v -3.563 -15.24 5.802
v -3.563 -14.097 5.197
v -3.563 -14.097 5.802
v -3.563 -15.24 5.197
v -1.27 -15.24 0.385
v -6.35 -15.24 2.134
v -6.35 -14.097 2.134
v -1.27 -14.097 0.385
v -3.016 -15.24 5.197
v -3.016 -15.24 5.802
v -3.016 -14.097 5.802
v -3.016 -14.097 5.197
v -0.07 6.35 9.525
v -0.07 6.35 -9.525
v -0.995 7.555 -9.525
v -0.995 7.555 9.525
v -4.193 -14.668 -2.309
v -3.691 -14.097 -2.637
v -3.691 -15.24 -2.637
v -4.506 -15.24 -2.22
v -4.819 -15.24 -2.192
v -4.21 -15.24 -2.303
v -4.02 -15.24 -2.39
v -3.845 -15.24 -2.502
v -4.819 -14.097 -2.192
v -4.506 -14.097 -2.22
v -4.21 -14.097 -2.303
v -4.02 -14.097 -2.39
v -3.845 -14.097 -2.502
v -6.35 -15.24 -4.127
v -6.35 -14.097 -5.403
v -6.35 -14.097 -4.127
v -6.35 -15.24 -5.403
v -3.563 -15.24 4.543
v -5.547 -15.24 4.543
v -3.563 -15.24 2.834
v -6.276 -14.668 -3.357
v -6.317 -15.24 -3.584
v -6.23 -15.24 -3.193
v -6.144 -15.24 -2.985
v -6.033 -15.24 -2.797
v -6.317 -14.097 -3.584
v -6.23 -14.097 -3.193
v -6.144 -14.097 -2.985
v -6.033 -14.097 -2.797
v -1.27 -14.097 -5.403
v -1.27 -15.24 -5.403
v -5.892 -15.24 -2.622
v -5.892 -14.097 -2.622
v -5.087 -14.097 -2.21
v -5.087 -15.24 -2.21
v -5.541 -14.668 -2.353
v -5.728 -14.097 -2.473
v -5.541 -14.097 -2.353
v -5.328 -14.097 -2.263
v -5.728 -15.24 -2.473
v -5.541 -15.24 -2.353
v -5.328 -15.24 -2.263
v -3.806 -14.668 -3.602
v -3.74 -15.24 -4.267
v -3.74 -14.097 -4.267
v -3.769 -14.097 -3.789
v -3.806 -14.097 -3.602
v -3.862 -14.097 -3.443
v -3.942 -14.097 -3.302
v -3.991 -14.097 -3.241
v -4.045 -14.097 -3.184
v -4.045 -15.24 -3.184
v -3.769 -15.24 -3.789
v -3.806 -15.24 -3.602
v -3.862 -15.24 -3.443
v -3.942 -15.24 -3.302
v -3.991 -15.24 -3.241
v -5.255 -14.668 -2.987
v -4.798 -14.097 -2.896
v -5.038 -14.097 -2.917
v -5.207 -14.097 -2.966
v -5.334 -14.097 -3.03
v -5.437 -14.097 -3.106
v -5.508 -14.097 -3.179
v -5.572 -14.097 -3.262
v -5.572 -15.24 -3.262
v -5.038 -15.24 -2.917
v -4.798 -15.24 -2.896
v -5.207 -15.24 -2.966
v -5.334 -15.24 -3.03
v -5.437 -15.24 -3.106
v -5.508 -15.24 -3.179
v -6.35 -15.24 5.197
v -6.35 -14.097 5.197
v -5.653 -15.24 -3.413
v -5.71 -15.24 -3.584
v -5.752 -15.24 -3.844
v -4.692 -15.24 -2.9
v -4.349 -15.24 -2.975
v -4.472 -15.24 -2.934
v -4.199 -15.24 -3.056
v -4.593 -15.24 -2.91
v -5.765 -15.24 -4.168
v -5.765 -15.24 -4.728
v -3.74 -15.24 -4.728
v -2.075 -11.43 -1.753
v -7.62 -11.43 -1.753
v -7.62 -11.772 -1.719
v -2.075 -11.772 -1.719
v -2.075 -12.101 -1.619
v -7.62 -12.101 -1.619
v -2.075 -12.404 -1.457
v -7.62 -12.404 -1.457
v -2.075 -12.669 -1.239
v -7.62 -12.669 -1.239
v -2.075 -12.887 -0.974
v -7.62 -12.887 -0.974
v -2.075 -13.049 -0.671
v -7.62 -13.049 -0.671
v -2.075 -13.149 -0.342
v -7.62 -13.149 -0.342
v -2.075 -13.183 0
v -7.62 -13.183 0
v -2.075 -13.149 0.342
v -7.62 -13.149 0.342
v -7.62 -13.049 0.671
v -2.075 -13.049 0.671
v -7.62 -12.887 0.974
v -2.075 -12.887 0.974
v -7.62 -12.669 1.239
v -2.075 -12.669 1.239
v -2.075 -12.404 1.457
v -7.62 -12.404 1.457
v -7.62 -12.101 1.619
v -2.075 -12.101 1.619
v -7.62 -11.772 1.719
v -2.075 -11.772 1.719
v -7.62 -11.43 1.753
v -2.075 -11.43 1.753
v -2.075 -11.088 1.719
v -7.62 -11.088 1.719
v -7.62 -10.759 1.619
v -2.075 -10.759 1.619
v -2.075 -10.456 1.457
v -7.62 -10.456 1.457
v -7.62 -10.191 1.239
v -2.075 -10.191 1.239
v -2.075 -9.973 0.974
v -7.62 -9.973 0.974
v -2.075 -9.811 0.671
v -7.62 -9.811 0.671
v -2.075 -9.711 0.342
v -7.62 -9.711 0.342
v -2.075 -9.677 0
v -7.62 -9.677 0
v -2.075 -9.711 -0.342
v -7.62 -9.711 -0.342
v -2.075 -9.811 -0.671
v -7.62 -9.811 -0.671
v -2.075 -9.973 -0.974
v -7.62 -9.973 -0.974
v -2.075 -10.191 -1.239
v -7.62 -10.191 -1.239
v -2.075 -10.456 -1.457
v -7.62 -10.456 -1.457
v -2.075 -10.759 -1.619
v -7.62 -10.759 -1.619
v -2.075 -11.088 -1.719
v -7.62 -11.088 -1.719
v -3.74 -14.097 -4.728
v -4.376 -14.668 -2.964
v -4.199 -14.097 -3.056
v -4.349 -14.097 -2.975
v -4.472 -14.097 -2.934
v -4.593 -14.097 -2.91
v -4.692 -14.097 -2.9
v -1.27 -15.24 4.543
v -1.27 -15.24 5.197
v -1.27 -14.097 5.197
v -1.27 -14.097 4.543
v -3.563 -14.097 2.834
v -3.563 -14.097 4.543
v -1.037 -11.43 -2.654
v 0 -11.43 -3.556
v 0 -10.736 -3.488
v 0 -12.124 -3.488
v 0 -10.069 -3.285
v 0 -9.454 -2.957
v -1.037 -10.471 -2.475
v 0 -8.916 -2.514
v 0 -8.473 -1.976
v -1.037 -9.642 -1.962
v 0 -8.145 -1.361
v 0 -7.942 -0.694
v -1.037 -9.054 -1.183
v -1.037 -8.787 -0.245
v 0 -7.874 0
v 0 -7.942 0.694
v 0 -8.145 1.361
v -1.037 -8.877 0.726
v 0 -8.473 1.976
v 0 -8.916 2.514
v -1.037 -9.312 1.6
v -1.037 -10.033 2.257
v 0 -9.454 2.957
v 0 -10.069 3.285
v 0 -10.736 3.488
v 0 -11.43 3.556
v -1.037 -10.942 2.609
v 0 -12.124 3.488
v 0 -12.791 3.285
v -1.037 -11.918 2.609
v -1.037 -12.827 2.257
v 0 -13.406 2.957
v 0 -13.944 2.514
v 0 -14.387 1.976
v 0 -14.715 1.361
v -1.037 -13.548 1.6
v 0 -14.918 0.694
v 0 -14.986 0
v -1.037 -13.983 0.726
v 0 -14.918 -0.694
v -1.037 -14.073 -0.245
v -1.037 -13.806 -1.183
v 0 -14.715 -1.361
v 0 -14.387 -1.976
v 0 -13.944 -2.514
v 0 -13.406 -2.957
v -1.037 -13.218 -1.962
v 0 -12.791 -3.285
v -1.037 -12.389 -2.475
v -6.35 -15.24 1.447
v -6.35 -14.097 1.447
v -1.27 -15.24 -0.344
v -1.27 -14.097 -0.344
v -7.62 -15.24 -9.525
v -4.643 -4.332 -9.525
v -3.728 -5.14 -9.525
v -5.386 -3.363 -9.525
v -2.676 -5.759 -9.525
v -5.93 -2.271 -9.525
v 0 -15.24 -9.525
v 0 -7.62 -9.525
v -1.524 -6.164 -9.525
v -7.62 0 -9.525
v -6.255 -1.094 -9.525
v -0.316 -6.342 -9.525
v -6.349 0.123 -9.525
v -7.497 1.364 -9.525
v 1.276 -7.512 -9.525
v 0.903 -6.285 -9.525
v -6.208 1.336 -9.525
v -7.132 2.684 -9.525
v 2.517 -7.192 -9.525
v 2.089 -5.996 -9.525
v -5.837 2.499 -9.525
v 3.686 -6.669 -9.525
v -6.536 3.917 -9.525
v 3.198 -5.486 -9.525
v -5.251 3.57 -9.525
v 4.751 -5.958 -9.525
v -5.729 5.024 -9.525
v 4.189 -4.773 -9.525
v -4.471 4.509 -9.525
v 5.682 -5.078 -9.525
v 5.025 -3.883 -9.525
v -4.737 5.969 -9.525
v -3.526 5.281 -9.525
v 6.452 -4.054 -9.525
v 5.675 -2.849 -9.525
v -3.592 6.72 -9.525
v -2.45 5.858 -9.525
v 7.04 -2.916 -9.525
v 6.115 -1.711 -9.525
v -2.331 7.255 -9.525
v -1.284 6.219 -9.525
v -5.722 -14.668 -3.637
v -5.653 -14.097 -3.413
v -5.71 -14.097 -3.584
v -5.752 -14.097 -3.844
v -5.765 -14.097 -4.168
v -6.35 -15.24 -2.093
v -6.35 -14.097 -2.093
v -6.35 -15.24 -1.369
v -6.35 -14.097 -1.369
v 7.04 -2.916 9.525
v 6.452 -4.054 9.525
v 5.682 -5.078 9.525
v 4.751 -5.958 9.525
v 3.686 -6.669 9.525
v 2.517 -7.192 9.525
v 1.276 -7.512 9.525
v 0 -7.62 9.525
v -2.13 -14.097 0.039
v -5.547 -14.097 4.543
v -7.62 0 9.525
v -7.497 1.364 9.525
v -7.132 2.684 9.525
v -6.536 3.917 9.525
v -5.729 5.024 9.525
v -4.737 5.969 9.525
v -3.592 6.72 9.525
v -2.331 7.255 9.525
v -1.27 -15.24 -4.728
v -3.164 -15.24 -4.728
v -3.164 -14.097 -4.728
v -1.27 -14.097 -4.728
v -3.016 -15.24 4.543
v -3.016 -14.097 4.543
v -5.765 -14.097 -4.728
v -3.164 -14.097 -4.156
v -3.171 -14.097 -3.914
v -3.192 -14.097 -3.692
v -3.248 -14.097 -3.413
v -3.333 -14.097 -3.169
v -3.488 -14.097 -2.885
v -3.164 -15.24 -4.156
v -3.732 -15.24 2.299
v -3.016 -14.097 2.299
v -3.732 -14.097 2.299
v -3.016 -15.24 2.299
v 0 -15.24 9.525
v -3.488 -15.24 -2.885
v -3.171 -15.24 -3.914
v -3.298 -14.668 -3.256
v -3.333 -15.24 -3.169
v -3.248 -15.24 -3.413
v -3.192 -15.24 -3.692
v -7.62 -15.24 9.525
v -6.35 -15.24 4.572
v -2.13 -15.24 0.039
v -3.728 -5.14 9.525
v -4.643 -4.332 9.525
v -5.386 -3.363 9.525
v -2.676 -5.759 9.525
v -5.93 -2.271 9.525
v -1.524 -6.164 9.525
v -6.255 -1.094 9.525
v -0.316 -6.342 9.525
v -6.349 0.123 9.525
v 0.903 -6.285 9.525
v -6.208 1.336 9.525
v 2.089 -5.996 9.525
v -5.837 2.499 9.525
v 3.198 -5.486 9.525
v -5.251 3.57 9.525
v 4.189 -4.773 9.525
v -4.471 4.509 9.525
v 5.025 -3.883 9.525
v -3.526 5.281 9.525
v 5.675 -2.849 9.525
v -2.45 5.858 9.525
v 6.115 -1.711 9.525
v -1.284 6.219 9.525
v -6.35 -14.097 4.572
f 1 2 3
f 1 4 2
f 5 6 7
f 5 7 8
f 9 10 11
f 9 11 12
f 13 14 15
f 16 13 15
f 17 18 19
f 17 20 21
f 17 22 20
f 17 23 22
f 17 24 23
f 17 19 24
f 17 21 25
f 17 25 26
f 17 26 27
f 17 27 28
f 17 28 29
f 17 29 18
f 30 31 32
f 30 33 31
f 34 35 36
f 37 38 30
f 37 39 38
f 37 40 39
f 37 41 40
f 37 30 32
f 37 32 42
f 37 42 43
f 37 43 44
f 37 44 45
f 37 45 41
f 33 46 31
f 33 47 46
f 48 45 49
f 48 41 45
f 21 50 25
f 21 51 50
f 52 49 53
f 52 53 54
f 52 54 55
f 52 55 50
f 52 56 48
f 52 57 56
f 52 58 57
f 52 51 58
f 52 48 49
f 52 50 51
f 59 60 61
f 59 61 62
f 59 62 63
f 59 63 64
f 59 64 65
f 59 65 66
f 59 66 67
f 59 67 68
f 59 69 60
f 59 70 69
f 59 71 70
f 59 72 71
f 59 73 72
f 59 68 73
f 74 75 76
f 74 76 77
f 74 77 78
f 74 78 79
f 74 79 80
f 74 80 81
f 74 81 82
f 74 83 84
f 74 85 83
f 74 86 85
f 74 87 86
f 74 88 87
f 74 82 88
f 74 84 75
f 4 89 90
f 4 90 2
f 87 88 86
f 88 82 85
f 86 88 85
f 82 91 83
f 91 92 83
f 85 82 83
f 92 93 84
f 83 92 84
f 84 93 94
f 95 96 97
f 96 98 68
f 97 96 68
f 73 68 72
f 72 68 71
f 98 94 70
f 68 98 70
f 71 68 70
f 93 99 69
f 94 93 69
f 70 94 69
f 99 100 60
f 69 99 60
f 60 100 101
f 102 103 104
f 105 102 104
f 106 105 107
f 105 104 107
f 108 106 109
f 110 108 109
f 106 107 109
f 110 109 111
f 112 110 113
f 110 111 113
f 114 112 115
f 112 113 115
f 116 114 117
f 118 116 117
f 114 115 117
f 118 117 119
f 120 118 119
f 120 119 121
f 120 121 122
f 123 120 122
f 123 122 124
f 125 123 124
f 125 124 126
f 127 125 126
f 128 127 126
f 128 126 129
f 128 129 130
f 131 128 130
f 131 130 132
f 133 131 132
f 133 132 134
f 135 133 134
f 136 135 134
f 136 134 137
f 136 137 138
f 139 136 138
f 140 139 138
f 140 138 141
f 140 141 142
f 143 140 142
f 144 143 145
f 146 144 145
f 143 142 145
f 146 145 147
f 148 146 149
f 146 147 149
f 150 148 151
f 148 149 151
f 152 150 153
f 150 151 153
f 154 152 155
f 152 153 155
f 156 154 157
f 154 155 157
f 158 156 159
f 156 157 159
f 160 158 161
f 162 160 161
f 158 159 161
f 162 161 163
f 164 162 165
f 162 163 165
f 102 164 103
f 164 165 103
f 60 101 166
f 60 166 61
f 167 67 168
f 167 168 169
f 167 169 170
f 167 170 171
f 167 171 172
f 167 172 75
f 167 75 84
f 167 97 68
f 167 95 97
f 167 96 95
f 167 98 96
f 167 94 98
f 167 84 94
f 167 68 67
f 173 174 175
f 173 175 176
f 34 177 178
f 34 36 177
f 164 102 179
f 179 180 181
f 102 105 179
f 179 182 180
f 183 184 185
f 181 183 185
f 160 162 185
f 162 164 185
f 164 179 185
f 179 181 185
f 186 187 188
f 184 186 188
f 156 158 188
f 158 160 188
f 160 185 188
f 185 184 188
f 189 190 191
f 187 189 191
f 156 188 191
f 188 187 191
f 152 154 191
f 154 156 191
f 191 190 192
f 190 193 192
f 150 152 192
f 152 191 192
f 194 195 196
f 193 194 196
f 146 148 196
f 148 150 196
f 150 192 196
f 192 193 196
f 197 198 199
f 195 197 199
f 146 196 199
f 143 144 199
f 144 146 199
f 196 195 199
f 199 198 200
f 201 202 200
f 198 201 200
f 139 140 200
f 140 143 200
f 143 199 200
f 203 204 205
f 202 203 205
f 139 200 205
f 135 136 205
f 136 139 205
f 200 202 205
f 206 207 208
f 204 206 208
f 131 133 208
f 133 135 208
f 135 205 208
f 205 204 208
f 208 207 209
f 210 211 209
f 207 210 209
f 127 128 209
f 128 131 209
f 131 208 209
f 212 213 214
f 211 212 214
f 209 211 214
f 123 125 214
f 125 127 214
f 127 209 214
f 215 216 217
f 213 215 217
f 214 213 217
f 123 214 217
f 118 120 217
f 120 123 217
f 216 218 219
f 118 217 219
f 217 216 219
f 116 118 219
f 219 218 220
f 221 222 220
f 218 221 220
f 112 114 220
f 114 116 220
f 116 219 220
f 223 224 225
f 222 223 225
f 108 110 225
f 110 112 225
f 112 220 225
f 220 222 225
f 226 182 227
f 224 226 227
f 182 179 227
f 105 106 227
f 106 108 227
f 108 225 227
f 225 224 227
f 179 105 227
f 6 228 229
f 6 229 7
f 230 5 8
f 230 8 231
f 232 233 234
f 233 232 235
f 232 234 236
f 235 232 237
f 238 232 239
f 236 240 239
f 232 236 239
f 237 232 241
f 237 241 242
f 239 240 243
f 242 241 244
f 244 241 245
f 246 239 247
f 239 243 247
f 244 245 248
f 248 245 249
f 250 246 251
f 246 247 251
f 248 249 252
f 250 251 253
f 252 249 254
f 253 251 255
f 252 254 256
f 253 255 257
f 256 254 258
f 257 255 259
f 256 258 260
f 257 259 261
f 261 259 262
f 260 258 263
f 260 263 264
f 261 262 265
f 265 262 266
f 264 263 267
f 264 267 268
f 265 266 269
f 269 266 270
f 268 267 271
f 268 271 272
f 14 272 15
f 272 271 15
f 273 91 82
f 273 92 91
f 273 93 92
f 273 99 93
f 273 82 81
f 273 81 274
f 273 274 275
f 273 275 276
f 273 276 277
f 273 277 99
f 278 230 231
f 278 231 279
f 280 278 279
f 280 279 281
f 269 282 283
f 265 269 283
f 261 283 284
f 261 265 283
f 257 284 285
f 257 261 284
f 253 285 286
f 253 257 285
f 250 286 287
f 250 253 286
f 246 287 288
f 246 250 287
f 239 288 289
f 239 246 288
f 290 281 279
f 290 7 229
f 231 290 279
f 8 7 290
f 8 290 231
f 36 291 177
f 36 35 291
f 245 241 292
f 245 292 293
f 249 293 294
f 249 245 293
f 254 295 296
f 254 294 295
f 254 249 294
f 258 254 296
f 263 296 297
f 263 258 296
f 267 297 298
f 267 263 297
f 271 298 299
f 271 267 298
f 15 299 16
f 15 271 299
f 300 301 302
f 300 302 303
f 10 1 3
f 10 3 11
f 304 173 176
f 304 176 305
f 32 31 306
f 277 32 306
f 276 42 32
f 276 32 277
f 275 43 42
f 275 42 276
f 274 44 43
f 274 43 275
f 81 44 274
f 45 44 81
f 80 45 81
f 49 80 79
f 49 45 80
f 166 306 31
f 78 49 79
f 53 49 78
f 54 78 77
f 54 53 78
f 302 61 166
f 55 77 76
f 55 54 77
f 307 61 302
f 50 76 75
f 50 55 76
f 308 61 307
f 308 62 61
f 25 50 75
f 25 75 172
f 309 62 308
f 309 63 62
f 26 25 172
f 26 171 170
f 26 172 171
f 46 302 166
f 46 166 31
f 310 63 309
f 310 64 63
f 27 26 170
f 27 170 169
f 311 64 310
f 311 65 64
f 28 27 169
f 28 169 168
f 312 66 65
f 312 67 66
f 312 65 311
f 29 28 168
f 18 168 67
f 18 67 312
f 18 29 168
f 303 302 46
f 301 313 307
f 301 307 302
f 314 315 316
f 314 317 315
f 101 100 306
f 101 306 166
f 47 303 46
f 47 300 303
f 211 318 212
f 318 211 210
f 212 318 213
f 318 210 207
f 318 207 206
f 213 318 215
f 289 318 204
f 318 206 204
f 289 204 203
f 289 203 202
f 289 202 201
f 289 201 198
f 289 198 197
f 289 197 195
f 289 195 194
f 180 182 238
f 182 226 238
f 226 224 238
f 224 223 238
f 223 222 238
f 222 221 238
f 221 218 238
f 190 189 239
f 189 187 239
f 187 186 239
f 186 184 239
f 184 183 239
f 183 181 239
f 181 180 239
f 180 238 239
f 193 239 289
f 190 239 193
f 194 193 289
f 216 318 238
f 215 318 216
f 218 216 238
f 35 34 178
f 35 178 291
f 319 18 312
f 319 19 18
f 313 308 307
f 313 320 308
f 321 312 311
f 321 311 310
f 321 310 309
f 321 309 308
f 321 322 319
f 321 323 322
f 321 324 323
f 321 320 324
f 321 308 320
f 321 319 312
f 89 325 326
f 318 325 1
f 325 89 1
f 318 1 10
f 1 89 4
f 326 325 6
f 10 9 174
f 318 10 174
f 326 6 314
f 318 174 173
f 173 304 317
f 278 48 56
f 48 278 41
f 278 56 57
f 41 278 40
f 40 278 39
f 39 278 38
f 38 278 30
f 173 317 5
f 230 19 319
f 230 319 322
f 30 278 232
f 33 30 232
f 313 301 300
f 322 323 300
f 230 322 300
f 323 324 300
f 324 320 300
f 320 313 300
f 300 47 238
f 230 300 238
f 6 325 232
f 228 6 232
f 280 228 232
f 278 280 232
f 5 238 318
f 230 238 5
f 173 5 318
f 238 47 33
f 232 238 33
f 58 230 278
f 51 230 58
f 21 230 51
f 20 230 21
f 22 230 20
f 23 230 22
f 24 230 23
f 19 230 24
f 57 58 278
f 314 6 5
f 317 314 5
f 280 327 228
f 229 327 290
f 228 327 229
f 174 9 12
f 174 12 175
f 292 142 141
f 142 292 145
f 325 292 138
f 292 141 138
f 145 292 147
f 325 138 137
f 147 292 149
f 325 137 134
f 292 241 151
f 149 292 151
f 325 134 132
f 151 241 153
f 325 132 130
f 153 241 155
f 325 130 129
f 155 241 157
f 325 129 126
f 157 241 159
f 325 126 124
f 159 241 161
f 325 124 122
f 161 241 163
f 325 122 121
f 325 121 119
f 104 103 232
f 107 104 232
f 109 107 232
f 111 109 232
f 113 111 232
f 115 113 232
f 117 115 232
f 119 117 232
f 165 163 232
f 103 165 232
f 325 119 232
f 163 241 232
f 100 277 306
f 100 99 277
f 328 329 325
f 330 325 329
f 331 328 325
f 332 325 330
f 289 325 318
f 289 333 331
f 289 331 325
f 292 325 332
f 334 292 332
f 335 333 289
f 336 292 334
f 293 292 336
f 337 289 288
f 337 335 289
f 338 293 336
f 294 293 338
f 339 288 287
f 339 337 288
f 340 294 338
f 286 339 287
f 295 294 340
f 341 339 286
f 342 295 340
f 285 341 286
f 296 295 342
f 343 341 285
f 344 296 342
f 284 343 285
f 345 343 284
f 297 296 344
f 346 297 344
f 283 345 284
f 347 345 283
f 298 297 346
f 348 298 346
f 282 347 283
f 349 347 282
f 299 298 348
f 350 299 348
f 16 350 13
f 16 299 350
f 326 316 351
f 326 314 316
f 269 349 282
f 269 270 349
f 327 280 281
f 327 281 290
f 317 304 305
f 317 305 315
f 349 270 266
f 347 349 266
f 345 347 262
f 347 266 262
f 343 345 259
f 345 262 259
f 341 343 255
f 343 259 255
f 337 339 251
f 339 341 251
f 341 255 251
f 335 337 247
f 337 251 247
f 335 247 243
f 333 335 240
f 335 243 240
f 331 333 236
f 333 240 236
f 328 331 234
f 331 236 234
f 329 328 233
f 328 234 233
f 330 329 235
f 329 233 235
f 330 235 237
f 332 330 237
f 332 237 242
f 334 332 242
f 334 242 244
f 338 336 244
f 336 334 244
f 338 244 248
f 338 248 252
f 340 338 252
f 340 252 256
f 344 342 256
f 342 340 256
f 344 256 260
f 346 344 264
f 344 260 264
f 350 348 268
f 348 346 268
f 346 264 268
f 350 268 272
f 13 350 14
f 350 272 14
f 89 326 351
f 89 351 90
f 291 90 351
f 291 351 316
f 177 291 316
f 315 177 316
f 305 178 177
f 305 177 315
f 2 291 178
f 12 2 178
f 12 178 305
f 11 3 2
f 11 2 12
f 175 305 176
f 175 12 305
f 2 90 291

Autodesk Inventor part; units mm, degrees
ref_plane "YZ Plane" through (0, 0, 0) normal (1, 0, 0) x (0, 1, 0)
ref_plane "XZ Plane" through (0, 0, 0) normal (0, 1, 0) x (-1, 0, 0)
ref_plane "XY Plane" through (0, 0, 0) normal (0, 0, 1) x (1, 0, 0)
sketch "Sketch4" plane through (0, 0, 0) normal (0, 0, 1) x (1, 0, 0)
  arc A0 (-0.0698, 6.3496) -> (6.1152, -1.7109) centre (0, 0) ccw
  arc A1 (-0.9946, 7.5548) -> (7.04, -2.916) centre (0, 0) ccw
  line L0 (0, 0) -> (0, 7.9375) construction
  line L1 (-0.0698, 6.3496) -> (6.1152, -1.7109) construction
  line L2 (-0.0698, 6.3496) -> (-0.9946, 7.5548)
  line L3 (6.1152, -1.7109) -> (7.04, -2.916)
  circle A2 centre (0, 0) radius 6.35
  dimension "d10" = 12.7
  dimension "d11" = 1.27
  dimension "d12" = 37.5
  dimension "d13" = 10.16
extrude "Extrusion3" add sketch "Sketch4" along normal mid plane 19.05 contours A0 L3 A1 L2
sketch "Sketch5" plane through (0, 0, 0) normal (0, 0, 1) x (1, 0, 0)
  arc A0 (-0.9946, 7.5548) -> (7.04, -2.916) centre (0, 0) ccw projected
  line L0 (-7.62, 0) -> (-7.62, -15.24)
  line L1 (-7.62, -15.24) -> (0, -15.24)
  line L2 (0, -15.24) -> (0, -7.62)
  circle A1 centre (0, 0) radius 7.9375
  dimension "d16" = 7.62
extrude "Extrusion4" add sketch "Sketch5" along normal mid plane 19.05 contours A0 L2 A1 L0 | A1 L2 L1 L0 picked at (-7.3048, -2.4081)
sketch "Sketch6" plane through (0, -15.24, 9.525) normal (1, 0, 0) x (0, 0, -1)
  line L0 (0, 7.62) -> (19.05, 7.62) projected
  line L1 (19.05, 7.62) -> (19.05, 0) projected
  line L2 (0, 0) -> (19.05, 0) projected
  line L3 (0, 0) -> (0, 7.62) projected
  line L4 (0, 7.62) -> (19.05, 0) construction
  line L5 (19.05, 7.62) -> (0, 0) construction
  point P0 (9.525, 15.24)
  point P1 (9.525, 3.81)
hole "Hole1" at (0, -11.43, 0) direction (-1, 0, 0) diameter 3.5052 end through all countersink diameter 7.112 countersink angle 82
sketch "Sketch10" plane through (-7.62, -15.24, 9.525) normal (0, -1, 0) x (1, 0, 0)
  line L0 (0, -19.05) -> (0, 0) projected
  line L1 (7.62, -19.05) -> (0, -19.05) projected
  line L2 (7.62, 0) -> (7.62, -19.05) projected
  line L3 (0, 0) -> (7.62, 0) projected
  line L4 (3.81, -19.05) -> (3.81, 0) construction
  spline S0 degree 2 poles (2.8014, -11.7171) (3.1307, -11.7171) (3.7235, -11.9518) (3.9294, -12.1617) knots 0 0 0 1 2 2 2
  spline S1 degree 2 poles (3.9294, -12.1617) (4.1887, -12.4252) (4.4563, -13.1374) (4.4563, -13.6808) knots 0 0 0 1 2 2 2
  line L5 (4.4563, -13.6808) -> (4.4563, -14.253)
  line L6 (4.4563, -14.253) -> (6.35, -14.253)
  line L7 (6.35, -14.253) -> (6.35, -14.9282)
  line L8 (6.35, -14.9282) -> (1.27, -14.9282)
  line L9 (1.27, -14.9282) -> (1.27, -13.652)
  spline S2 degree 2 poles (1.27, -13.652) (1.27, -13.1991) (1.4182, -12.5652) (1.587, -12.3223) knots 0 0 0 1 2 2 2
  spline S3 degree 2 poles (1.587, -12.3223) (1.7805, -12.0382) (2.3774, -11.7171) (2.8014, -11.7171) knots 0 0 0 1 2 2 2
  spline S4 degree 2 poles (2.822, -12.4211) (2.5585, -12.4211) (2.1716, -12.6022) (2.0481, -12.7875) knots 0 0 0 1 2 2 2
  spline S5 degree 2 poles (2.0481, -12.7875) (1.941, -12.948) (1.8546, -13.3762) (1.8546, -13.6932) knots 0 0 0 1 2 2 2
  line L10 (1.8546, -13.6932) -> (1.8546, -14.253)
  line L11 (1.8546, -14.253) -> (3.88, -14.253)
  line L12 (3.88, -14.253) -> (3.88, -13.792)
  spline S6 degree 2 poles (3.88, -13.792) (3.88, -13.3803) (3.7482, -12.8739) (3.5753, -12.7093) knots 0 0 0 1 2 2 2
  spline S7 degree 2 poles (3.5753, -12.7093) (3.423, -12.5569) (3.0649, -12.4211) (2.822, -12.4211) knots 0 0 0 1 2 2 2
  line L13 (1.27, -7.3905) -> (6.35, -9.1401)
  line L14 (6.35, -9.1401) -> (6.35, -9.8687)
  line L15 (6.35, -9.8687) -> (1.27, -11.6183)
  line L16 (1.27, -11.6183) -> (1.27, -10.8938)
  line L17 (1.27, -10.8938) -> (5.4896, -9.4859)
  line L18 (5.4896, -9.4859) -> (1.27, -8.078)
  line L19 (1.27, -8.078) -> (1.27, -7.3905)
  line L20 (4.6045, -3.7225) -> (4.6045, -4.3277)
  line L21 (4.6045, -4.3277) -> (6.35, -4.3277)
  line L22 (6.35, -4.3277) -> (6.35, -4.9822)
  line L23 (6.35, -4.9822) -> (4.6045, -4.9822)
  line L24 (4.6045, -4.9822) -> (4.6045, -7.2258)
  line L25 (4.6045, -7.2258) -> (3.8882, -7.2258)
  line L26 (3.8882, -7.2258) -> (1.27, -4.9534)
  line L27 (1.27, -4.9534) -> (1.27, -4.3277)
  line L28 (1.27, -4.3277) -> (4.057, -4.3277)
  line L29 (4.057, -4.3277) -> (4.057, -3.7225)
  line L30 (4.057, -3.7225) -> (4.6045, -3.7225)
  line L31 (4.057, -4.9822) -> (2.0728, -4.9822)
  line L32 (2.0728, -4.9822) -> (4.057, -6.6907)
  line L33 (4.057, -6.6907) -> (4.057, -4.9822)
  point P0 (7.62, -9.525)
extrude "Text" cut sketch "Sketch10" against normal blind 1.143 contours S0 S1 L5 L6 L7 L8 L9 S2 S3 | L13 L14 L15 L16 L17 L18 L19 | L20 L21 L22 L23 L24 L25 L26 L27 L28 L29 L30
equation "\"d10\" = shadeDiameter"
equation "\"d11\" = shadeHolderWallThickness"
equation "\"d13\" = openingForShade"
equation "\"d14\" = partWidth"
equation "\"d16\" = flatBelowShade"
equation "\"d17\" = partWidth"
equation "\"d28\" = textDepth"
equation "\"shadeDiameter\" = 12.7"
equation "\"partWidth\" = 19.05"
equation "\"backThickness\" = 1.905"
equation "\"backHeight\" = 25.4"
equation "\"cutTiltAngle\" = 52.5deg"
equation "\"flatBelowShade\" = 7.62"
equation "\"shadeHolderWallThickness\" = 1.27"
equation "\"openingForShade\" = 10.16"
equation "\"textDepth\" = 1.143"
properties part number "shadeHolderV02"
